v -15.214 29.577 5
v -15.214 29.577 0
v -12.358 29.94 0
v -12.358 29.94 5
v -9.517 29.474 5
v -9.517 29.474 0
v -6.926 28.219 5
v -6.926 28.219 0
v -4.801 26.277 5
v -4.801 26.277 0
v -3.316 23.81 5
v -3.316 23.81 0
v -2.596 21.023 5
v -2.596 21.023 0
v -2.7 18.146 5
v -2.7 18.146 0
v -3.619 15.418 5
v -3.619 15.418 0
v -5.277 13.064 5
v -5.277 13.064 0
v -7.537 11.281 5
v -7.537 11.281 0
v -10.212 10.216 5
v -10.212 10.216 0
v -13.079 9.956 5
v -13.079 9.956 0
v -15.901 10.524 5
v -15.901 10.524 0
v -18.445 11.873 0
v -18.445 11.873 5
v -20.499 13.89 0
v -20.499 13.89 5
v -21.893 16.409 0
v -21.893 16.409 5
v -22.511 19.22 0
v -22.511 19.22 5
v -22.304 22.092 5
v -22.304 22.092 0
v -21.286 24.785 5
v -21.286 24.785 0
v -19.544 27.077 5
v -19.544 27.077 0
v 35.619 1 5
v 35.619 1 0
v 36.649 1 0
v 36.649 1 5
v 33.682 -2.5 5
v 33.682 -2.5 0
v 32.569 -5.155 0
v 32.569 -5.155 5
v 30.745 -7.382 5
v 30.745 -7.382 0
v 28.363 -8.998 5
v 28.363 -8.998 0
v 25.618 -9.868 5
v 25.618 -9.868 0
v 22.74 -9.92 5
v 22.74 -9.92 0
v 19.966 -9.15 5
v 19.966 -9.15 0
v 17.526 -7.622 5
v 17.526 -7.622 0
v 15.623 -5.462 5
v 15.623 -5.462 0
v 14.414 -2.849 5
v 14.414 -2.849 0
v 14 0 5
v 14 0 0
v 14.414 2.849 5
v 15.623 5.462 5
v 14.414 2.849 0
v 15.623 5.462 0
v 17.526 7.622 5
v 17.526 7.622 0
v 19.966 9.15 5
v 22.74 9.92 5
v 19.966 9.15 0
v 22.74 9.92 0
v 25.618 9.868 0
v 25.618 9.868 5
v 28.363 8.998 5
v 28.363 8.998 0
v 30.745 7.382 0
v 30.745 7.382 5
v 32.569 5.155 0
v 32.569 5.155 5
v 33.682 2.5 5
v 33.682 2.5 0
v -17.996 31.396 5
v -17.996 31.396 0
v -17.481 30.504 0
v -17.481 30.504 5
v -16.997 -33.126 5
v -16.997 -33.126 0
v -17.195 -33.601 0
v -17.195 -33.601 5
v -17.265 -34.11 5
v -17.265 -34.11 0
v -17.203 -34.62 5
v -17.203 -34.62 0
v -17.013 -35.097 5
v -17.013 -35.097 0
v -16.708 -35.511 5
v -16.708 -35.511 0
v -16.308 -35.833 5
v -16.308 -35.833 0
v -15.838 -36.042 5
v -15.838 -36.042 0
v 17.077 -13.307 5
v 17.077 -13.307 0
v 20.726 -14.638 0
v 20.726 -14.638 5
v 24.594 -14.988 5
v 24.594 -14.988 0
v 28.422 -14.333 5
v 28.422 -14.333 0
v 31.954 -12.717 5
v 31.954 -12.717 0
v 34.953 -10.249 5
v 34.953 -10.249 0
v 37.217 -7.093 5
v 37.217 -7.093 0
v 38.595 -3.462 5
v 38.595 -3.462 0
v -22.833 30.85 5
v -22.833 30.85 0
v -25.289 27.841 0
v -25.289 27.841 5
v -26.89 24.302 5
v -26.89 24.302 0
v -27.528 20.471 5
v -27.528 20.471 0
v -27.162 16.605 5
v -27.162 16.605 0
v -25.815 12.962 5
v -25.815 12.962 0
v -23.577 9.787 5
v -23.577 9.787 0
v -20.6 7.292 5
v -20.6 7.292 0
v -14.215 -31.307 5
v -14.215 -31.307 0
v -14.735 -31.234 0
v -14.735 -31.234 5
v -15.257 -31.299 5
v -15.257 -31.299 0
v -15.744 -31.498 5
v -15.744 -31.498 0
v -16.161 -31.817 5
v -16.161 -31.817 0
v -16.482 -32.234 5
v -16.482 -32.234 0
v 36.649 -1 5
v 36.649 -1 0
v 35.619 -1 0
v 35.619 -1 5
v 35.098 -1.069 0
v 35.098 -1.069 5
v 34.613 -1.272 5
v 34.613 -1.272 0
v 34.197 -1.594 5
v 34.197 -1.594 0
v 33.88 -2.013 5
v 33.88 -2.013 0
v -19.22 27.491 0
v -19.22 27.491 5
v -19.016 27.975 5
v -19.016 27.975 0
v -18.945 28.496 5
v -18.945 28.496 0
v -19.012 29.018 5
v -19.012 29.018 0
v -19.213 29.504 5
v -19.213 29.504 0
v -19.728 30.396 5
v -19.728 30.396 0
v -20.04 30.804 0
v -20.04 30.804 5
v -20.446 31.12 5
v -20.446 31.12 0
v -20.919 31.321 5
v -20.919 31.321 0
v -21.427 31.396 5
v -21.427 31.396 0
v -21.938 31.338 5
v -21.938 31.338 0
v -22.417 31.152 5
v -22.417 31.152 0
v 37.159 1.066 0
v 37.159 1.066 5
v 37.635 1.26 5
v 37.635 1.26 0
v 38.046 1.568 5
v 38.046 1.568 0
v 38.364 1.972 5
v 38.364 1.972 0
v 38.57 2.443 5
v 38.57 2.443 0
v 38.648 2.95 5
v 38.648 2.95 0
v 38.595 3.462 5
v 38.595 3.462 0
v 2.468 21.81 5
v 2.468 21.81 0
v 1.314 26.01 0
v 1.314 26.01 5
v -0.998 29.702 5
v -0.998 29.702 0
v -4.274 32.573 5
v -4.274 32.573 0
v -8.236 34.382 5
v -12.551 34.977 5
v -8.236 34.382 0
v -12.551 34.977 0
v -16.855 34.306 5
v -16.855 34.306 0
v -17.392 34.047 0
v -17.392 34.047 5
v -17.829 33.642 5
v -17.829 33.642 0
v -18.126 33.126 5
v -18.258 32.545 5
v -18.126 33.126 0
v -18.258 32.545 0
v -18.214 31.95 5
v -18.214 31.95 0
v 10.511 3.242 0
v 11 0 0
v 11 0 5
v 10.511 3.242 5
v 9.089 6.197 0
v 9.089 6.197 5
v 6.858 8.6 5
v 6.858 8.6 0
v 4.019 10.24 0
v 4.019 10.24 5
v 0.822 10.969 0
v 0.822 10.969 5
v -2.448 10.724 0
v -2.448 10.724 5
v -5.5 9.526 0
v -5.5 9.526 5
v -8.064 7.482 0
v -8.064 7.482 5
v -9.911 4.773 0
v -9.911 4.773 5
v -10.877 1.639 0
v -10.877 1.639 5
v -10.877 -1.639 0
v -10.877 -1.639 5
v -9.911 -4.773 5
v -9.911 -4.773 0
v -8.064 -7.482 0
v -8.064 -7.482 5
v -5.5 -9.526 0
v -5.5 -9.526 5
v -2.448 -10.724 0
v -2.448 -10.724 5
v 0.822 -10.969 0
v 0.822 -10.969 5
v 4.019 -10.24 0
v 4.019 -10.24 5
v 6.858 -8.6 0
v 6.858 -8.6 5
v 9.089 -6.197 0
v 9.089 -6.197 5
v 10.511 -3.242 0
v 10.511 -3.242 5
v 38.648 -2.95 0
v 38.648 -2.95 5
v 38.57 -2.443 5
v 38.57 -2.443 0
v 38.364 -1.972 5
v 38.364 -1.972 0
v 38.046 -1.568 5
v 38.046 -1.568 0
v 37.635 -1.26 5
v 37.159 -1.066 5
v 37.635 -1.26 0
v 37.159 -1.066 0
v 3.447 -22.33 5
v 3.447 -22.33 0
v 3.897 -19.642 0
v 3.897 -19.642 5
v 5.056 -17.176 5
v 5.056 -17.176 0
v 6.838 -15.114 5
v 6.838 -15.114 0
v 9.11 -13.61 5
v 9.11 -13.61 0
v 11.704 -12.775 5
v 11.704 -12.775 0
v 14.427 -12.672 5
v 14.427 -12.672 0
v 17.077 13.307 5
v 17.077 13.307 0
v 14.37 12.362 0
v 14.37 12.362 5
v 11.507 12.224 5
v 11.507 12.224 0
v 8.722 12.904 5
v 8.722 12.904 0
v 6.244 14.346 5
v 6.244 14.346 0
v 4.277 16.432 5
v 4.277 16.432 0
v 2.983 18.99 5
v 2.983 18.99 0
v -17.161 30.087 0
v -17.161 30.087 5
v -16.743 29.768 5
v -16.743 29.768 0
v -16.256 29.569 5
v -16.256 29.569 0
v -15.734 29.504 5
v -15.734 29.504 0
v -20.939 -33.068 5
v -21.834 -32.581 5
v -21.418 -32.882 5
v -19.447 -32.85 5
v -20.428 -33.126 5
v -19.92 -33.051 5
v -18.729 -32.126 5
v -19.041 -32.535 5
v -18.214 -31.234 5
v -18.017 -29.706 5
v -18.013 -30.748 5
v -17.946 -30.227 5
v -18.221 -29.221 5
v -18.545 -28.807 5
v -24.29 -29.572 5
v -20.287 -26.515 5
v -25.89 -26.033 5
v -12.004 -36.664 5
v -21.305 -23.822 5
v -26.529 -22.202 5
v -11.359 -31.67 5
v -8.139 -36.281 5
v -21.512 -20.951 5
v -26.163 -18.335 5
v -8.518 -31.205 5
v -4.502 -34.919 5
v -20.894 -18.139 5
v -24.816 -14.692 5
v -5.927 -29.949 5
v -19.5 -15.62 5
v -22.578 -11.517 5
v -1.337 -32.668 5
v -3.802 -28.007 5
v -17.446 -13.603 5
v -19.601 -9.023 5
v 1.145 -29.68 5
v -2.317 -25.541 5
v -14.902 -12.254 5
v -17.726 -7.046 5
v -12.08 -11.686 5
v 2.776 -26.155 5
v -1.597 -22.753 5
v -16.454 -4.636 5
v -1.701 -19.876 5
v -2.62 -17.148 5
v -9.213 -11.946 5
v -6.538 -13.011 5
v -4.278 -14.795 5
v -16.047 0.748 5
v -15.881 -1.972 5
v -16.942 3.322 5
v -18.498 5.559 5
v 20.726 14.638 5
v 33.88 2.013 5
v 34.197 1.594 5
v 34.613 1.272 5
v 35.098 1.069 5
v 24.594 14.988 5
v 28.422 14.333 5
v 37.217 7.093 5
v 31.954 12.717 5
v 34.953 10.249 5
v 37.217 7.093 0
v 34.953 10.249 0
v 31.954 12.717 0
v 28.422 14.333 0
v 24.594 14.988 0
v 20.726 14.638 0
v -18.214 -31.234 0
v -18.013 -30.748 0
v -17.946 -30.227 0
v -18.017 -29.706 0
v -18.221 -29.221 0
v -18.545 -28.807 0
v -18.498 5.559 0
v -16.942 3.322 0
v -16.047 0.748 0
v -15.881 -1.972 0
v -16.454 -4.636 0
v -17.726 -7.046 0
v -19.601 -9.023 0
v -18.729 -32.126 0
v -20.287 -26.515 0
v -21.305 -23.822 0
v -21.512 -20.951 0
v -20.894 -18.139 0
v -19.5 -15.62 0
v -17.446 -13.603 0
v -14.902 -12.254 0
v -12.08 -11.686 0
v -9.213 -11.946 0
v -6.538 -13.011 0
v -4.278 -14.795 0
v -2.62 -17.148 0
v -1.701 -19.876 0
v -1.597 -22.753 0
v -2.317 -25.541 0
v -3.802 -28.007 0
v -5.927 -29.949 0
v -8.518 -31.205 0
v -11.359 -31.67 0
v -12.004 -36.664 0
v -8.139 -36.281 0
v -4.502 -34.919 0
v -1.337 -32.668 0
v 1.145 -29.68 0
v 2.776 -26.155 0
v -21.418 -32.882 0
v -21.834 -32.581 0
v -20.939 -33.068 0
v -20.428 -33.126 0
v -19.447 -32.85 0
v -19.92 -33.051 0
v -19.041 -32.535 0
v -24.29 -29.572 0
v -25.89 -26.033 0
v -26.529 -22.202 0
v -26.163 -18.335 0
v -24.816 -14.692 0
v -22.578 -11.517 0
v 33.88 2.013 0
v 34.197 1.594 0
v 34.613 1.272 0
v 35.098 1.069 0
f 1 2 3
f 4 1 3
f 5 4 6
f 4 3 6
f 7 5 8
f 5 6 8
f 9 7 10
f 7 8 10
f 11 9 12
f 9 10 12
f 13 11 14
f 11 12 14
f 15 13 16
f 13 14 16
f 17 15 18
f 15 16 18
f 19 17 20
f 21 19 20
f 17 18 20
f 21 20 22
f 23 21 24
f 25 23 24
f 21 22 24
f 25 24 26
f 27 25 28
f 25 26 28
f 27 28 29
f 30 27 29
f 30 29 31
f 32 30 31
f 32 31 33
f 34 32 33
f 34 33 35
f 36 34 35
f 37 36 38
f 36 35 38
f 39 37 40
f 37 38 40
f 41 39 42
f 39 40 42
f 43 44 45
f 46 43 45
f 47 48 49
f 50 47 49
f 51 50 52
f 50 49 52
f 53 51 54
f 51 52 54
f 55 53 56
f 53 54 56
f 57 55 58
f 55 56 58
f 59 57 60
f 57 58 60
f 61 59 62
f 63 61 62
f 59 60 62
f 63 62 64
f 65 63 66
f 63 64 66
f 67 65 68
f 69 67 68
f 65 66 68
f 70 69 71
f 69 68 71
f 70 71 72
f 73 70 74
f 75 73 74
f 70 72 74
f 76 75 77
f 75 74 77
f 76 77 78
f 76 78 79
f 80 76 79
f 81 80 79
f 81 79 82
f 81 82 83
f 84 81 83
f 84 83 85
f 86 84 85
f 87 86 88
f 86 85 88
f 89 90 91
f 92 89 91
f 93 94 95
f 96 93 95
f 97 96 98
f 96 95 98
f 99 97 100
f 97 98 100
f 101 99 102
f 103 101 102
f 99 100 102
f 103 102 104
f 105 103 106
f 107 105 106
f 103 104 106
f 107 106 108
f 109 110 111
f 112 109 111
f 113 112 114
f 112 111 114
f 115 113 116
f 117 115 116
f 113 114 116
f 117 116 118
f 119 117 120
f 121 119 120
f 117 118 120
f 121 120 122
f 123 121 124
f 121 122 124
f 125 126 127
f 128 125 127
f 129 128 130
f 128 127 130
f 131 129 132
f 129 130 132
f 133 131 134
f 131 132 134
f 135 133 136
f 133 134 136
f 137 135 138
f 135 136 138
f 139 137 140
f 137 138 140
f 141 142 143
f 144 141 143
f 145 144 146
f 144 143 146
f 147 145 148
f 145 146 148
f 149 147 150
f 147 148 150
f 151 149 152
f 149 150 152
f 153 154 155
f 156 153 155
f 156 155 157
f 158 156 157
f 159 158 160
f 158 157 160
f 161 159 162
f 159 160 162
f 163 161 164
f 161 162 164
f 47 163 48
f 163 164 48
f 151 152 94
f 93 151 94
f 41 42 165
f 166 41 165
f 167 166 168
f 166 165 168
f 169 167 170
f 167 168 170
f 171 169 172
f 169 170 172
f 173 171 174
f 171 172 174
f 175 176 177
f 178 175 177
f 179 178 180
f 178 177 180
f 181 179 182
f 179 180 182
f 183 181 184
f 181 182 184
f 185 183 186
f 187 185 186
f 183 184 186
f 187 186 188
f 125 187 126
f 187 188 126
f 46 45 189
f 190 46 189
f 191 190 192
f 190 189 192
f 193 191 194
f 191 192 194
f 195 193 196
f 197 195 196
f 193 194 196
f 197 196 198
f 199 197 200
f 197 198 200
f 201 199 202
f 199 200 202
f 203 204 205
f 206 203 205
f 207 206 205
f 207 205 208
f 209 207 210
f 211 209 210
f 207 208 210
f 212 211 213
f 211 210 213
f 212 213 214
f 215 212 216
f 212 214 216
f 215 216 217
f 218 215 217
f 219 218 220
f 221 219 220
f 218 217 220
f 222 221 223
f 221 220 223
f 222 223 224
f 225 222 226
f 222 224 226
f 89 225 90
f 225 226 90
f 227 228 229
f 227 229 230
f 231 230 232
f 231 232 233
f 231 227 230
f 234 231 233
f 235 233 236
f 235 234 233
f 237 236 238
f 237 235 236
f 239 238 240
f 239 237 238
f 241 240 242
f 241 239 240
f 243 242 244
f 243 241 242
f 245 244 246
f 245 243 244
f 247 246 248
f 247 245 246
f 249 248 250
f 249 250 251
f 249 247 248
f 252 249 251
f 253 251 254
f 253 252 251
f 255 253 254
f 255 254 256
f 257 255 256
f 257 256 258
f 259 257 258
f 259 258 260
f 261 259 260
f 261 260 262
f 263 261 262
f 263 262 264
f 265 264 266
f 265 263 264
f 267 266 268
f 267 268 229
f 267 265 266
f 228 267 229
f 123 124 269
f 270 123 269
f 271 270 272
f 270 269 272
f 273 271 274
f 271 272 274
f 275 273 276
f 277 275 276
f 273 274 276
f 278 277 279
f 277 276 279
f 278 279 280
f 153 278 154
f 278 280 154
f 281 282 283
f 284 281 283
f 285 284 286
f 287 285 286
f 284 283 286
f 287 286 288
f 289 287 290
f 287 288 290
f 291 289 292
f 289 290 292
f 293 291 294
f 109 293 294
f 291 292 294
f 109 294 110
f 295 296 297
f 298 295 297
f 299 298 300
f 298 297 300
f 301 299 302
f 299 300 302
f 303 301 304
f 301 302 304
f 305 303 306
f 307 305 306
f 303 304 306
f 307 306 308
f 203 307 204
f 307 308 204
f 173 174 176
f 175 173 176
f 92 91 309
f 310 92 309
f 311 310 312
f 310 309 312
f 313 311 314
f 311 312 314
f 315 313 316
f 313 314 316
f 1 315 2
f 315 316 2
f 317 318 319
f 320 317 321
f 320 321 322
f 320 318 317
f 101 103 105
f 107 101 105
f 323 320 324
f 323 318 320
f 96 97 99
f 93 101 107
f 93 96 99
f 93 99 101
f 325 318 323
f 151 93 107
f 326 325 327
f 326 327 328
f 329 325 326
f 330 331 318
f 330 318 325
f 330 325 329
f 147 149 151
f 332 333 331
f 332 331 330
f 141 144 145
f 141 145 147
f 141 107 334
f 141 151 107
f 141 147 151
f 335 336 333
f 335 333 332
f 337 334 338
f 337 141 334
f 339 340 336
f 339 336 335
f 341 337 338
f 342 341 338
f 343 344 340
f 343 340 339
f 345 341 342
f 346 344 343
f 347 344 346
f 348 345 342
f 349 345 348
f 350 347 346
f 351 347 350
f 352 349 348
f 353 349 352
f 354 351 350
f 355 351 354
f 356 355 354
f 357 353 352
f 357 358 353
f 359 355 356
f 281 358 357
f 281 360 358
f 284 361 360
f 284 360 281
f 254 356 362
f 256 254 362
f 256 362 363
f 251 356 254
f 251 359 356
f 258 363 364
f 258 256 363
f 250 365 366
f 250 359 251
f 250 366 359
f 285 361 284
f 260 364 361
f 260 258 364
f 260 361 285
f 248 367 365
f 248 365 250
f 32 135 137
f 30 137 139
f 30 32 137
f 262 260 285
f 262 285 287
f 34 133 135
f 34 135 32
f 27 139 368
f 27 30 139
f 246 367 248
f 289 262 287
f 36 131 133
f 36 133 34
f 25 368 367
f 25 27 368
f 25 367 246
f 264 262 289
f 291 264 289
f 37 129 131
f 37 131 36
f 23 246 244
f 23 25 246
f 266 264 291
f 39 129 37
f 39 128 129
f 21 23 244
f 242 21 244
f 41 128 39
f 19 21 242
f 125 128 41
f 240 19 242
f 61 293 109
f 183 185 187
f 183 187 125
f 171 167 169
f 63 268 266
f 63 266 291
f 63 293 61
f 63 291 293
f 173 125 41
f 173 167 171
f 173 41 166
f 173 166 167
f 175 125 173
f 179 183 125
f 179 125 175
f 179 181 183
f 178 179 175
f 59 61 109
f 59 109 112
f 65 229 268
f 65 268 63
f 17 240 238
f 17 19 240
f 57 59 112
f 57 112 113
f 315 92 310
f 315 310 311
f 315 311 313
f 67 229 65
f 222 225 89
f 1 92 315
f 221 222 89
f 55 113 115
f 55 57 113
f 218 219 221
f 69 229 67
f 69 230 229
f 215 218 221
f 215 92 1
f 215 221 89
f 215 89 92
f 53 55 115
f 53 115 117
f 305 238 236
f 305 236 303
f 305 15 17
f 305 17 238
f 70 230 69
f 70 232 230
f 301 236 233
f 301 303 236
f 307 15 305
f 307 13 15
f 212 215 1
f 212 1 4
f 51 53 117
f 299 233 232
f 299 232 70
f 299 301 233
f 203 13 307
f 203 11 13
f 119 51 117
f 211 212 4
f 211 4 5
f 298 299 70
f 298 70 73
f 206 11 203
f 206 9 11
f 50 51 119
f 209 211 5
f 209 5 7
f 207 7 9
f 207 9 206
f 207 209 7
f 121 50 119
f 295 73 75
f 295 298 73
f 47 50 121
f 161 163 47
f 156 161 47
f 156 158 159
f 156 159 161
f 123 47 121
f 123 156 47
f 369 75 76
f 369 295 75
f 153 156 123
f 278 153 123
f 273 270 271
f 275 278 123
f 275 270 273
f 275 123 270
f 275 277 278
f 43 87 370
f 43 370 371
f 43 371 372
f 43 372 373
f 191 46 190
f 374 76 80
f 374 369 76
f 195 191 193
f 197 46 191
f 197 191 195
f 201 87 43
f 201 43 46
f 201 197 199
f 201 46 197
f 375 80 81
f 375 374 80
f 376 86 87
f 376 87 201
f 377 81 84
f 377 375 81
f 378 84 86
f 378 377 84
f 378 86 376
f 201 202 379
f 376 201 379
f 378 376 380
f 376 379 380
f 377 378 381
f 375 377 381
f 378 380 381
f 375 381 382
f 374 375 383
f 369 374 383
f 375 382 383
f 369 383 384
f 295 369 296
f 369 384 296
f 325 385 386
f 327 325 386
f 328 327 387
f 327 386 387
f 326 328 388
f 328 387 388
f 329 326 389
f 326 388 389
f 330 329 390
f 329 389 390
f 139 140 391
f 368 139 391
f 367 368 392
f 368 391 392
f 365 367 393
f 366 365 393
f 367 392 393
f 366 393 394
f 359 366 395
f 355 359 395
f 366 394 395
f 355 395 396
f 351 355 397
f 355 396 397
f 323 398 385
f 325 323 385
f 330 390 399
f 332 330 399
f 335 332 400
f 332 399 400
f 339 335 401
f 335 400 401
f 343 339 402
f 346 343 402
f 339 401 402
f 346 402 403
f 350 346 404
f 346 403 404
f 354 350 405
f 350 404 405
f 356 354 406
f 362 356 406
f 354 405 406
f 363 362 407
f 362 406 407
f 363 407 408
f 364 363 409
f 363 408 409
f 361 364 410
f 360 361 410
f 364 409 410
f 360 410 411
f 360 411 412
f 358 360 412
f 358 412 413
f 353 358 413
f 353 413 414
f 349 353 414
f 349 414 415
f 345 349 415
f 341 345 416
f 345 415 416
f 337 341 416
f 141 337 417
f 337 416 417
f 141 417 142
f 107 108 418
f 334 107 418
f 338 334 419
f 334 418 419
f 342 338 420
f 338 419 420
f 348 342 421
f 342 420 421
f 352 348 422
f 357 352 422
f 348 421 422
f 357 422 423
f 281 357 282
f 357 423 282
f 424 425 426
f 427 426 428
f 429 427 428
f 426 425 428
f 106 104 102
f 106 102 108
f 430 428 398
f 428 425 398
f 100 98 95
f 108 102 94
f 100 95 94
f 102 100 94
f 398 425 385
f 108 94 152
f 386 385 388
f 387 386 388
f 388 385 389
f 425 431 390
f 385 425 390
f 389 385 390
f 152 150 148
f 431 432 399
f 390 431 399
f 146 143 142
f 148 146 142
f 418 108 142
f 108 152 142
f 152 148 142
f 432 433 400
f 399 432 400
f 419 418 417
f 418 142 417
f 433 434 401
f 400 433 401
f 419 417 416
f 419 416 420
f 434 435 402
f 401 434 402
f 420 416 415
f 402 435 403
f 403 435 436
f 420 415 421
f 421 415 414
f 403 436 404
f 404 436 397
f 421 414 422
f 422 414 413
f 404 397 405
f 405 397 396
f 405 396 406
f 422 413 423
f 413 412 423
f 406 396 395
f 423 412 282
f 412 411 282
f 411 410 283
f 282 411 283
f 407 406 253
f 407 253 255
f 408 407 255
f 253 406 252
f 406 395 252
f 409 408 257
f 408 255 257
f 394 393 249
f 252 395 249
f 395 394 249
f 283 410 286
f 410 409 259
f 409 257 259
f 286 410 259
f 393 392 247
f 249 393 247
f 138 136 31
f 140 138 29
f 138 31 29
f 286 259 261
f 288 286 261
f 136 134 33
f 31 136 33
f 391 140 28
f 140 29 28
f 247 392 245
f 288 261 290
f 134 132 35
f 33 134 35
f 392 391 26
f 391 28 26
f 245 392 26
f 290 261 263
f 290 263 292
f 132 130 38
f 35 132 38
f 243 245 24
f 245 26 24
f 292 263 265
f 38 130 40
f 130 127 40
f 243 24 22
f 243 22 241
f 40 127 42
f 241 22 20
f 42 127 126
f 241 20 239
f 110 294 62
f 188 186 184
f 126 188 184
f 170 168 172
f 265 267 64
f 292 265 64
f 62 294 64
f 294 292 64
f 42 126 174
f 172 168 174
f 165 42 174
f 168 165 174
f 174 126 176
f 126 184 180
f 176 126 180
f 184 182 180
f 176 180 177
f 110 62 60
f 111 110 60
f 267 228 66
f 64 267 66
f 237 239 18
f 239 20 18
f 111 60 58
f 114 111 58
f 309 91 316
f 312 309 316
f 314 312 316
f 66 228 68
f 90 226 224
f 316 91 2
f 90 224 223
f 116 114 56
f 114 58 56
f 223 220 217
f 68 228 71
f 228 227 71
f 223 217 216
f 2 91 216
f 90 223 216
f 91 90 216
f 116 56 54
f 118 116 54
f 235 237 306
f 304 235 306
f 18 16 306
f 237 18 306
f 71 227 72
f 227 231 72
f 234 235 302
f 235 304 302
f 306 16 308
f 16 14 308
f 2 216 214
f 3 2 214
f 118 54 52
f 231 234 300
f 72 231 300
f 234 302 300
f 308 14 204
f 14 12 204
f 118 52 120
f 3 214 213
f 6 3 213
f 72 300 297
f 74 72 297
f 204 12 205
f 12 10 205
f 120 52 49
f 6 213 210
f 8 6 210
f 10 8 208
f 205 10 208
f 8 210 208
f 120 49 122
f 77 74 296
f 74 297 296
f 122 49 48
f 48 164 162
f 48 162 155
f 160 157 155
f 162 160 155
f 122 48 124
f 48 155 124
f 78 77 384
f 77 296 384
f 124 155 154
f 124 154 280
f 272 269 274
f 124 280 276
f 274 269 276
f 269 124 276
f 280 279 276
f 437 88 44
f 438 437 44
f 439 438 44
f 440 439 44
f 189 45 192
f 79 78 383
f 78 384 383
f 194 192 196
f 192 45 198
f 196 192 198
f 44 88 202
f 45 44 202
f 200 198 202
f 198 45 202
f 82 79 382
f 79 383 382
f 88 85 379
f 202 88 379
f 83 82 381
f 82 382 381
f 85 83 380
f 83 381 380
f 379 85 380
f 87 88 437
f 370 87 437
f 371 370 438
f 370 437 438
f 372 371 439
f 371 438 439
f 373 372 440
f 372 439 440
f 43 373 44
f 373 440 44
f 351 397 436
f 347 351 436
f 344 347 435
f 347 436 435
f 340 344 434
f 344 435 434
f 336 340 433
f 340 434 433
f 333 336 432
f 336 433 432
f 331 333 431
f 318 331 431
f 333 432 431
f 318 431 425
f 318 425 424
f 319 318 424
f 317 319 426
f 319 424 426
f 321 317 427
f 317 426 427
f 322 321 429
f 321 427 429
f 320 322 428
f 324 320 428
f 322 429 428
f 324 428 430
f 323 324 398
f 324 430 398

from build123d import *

# Parameters (mm, degrees)
F0_R     = 11
F1_DEPTH = 5


with BuildPart() as f1:
    # F0 (on Top) → F1 (new body)
    with BuildSketch(Plane.XY):
        with BuildLine():
            ThreePointArc((33.682458, -2.5), (14, 0), (33.682458, 2.5))
            ThreePointArc((33.682458, 2.5), (34.394205, 1.418861), (35.61895, 1))
            Line((35.61895, 1), (36.649111, 1))
            ThreePointArc((36.649111, 1), (38.21804, 1.759653), (38.595128, 3.461538))
            ThreePointArc((38.595128, 3.461538), (30.240785, 13.64011), (17.076923, 13.306803))
            ThreePointArc((17.076923, 13.306803), (7.430987, 13.535462), (2.468312, 21.810015))
            ThreePointArc((2.468312, 21.810015), (-4.273896, 32.573046), (-16.855466, 34.306331))
            ThreePointArc((-16.855466, 34.306331), (-18.126104, 33.125515), (-17.996029, 31.395797))
            Line((-17.996029, 31.395797), (-17.480949, 30.503651))
            ThreePointArc((-17.480949, 30.503651), (-16.505832, 29.652422), (-15.213665, 29.5766))
            ThreePointArc((-15.213665, 29.5766), (-7.537499, 11.281092), (-19.543792, 27.0766))
            ThreePointArc((-19.543792, 27.0766), (-18.963372, 28.233561), (-19.213, 29.503651))
            Line((-19.213, 29.503651), (-19.72808, 30.395797))
            ThreePointArc((-19.72808, 30.395797), (-21.170423, 31.374703), (-22.832843, 30.850328))
            ThreePointArc((-22.832843, 30.850328), (-27.470574, 18.525969), (-20.59999, 7.292384))
            ThreePointArc((-20.59999, 7.292384), (-15.870723, -0.606189), (-19.600953, -9.022768))
            ThreePointArc((-19.600953, -9.022768), (-26.471536, -20.256353), (-21.833806, -32.580712))
            ThreePointArc((-21.833806, -32.580712), (-20.171385, -33.105087), (-18.729042, -32.126181))
            Line((-18.729042, -32.126181), (-18.213962, -31.234036))
            ThreePointArc((-18.213962, -31.234036), (-17.964334, -29.963945), (-18.544754, -28.806985))
            ThreePointArc((-18.544754, -28.806985), (-6.538462, -13.011476), (-14.214627, -31.306985))
            ThreePointArc((-14.214627, -31.306985), (-15.506794, -31.382806), (-16.481911, -32.234036))
            Line((-16.481911, -32.234036), (-16.996991, -33.126181))
            ThreePointArc((-16.996991, -33.126181), (-17.123577, -34.86474), (-15.838245, -36.04225))
            ThreePointArc((-15.838245, -36.04225), (-2.846172, -33.896463), (3.447106, -22.329571))
            ThreePointArc((3.447106, -22.329571), (7.922837, -14.284619), (17.076923, -13.306803))
            ThreePointArc((17.076923, -13.306803), (30.240785, -13.64011), (38.595128, -3.461538))
            ThreePointArc((38.595128, -3.461538), (38.21804, -1.759653), (36.649111, -1))
            Line((36.649111, -1), (35.61895, -1))
            ThreePointArc((35.61895, -1), (34.394205, -1.418861), (33.682458, -2.5))
        make_face()
        Circle(F0_R, mode=Mode.SUBTRACT)
    extrude(amount=F1_DEPTH)


solid = f1.part
